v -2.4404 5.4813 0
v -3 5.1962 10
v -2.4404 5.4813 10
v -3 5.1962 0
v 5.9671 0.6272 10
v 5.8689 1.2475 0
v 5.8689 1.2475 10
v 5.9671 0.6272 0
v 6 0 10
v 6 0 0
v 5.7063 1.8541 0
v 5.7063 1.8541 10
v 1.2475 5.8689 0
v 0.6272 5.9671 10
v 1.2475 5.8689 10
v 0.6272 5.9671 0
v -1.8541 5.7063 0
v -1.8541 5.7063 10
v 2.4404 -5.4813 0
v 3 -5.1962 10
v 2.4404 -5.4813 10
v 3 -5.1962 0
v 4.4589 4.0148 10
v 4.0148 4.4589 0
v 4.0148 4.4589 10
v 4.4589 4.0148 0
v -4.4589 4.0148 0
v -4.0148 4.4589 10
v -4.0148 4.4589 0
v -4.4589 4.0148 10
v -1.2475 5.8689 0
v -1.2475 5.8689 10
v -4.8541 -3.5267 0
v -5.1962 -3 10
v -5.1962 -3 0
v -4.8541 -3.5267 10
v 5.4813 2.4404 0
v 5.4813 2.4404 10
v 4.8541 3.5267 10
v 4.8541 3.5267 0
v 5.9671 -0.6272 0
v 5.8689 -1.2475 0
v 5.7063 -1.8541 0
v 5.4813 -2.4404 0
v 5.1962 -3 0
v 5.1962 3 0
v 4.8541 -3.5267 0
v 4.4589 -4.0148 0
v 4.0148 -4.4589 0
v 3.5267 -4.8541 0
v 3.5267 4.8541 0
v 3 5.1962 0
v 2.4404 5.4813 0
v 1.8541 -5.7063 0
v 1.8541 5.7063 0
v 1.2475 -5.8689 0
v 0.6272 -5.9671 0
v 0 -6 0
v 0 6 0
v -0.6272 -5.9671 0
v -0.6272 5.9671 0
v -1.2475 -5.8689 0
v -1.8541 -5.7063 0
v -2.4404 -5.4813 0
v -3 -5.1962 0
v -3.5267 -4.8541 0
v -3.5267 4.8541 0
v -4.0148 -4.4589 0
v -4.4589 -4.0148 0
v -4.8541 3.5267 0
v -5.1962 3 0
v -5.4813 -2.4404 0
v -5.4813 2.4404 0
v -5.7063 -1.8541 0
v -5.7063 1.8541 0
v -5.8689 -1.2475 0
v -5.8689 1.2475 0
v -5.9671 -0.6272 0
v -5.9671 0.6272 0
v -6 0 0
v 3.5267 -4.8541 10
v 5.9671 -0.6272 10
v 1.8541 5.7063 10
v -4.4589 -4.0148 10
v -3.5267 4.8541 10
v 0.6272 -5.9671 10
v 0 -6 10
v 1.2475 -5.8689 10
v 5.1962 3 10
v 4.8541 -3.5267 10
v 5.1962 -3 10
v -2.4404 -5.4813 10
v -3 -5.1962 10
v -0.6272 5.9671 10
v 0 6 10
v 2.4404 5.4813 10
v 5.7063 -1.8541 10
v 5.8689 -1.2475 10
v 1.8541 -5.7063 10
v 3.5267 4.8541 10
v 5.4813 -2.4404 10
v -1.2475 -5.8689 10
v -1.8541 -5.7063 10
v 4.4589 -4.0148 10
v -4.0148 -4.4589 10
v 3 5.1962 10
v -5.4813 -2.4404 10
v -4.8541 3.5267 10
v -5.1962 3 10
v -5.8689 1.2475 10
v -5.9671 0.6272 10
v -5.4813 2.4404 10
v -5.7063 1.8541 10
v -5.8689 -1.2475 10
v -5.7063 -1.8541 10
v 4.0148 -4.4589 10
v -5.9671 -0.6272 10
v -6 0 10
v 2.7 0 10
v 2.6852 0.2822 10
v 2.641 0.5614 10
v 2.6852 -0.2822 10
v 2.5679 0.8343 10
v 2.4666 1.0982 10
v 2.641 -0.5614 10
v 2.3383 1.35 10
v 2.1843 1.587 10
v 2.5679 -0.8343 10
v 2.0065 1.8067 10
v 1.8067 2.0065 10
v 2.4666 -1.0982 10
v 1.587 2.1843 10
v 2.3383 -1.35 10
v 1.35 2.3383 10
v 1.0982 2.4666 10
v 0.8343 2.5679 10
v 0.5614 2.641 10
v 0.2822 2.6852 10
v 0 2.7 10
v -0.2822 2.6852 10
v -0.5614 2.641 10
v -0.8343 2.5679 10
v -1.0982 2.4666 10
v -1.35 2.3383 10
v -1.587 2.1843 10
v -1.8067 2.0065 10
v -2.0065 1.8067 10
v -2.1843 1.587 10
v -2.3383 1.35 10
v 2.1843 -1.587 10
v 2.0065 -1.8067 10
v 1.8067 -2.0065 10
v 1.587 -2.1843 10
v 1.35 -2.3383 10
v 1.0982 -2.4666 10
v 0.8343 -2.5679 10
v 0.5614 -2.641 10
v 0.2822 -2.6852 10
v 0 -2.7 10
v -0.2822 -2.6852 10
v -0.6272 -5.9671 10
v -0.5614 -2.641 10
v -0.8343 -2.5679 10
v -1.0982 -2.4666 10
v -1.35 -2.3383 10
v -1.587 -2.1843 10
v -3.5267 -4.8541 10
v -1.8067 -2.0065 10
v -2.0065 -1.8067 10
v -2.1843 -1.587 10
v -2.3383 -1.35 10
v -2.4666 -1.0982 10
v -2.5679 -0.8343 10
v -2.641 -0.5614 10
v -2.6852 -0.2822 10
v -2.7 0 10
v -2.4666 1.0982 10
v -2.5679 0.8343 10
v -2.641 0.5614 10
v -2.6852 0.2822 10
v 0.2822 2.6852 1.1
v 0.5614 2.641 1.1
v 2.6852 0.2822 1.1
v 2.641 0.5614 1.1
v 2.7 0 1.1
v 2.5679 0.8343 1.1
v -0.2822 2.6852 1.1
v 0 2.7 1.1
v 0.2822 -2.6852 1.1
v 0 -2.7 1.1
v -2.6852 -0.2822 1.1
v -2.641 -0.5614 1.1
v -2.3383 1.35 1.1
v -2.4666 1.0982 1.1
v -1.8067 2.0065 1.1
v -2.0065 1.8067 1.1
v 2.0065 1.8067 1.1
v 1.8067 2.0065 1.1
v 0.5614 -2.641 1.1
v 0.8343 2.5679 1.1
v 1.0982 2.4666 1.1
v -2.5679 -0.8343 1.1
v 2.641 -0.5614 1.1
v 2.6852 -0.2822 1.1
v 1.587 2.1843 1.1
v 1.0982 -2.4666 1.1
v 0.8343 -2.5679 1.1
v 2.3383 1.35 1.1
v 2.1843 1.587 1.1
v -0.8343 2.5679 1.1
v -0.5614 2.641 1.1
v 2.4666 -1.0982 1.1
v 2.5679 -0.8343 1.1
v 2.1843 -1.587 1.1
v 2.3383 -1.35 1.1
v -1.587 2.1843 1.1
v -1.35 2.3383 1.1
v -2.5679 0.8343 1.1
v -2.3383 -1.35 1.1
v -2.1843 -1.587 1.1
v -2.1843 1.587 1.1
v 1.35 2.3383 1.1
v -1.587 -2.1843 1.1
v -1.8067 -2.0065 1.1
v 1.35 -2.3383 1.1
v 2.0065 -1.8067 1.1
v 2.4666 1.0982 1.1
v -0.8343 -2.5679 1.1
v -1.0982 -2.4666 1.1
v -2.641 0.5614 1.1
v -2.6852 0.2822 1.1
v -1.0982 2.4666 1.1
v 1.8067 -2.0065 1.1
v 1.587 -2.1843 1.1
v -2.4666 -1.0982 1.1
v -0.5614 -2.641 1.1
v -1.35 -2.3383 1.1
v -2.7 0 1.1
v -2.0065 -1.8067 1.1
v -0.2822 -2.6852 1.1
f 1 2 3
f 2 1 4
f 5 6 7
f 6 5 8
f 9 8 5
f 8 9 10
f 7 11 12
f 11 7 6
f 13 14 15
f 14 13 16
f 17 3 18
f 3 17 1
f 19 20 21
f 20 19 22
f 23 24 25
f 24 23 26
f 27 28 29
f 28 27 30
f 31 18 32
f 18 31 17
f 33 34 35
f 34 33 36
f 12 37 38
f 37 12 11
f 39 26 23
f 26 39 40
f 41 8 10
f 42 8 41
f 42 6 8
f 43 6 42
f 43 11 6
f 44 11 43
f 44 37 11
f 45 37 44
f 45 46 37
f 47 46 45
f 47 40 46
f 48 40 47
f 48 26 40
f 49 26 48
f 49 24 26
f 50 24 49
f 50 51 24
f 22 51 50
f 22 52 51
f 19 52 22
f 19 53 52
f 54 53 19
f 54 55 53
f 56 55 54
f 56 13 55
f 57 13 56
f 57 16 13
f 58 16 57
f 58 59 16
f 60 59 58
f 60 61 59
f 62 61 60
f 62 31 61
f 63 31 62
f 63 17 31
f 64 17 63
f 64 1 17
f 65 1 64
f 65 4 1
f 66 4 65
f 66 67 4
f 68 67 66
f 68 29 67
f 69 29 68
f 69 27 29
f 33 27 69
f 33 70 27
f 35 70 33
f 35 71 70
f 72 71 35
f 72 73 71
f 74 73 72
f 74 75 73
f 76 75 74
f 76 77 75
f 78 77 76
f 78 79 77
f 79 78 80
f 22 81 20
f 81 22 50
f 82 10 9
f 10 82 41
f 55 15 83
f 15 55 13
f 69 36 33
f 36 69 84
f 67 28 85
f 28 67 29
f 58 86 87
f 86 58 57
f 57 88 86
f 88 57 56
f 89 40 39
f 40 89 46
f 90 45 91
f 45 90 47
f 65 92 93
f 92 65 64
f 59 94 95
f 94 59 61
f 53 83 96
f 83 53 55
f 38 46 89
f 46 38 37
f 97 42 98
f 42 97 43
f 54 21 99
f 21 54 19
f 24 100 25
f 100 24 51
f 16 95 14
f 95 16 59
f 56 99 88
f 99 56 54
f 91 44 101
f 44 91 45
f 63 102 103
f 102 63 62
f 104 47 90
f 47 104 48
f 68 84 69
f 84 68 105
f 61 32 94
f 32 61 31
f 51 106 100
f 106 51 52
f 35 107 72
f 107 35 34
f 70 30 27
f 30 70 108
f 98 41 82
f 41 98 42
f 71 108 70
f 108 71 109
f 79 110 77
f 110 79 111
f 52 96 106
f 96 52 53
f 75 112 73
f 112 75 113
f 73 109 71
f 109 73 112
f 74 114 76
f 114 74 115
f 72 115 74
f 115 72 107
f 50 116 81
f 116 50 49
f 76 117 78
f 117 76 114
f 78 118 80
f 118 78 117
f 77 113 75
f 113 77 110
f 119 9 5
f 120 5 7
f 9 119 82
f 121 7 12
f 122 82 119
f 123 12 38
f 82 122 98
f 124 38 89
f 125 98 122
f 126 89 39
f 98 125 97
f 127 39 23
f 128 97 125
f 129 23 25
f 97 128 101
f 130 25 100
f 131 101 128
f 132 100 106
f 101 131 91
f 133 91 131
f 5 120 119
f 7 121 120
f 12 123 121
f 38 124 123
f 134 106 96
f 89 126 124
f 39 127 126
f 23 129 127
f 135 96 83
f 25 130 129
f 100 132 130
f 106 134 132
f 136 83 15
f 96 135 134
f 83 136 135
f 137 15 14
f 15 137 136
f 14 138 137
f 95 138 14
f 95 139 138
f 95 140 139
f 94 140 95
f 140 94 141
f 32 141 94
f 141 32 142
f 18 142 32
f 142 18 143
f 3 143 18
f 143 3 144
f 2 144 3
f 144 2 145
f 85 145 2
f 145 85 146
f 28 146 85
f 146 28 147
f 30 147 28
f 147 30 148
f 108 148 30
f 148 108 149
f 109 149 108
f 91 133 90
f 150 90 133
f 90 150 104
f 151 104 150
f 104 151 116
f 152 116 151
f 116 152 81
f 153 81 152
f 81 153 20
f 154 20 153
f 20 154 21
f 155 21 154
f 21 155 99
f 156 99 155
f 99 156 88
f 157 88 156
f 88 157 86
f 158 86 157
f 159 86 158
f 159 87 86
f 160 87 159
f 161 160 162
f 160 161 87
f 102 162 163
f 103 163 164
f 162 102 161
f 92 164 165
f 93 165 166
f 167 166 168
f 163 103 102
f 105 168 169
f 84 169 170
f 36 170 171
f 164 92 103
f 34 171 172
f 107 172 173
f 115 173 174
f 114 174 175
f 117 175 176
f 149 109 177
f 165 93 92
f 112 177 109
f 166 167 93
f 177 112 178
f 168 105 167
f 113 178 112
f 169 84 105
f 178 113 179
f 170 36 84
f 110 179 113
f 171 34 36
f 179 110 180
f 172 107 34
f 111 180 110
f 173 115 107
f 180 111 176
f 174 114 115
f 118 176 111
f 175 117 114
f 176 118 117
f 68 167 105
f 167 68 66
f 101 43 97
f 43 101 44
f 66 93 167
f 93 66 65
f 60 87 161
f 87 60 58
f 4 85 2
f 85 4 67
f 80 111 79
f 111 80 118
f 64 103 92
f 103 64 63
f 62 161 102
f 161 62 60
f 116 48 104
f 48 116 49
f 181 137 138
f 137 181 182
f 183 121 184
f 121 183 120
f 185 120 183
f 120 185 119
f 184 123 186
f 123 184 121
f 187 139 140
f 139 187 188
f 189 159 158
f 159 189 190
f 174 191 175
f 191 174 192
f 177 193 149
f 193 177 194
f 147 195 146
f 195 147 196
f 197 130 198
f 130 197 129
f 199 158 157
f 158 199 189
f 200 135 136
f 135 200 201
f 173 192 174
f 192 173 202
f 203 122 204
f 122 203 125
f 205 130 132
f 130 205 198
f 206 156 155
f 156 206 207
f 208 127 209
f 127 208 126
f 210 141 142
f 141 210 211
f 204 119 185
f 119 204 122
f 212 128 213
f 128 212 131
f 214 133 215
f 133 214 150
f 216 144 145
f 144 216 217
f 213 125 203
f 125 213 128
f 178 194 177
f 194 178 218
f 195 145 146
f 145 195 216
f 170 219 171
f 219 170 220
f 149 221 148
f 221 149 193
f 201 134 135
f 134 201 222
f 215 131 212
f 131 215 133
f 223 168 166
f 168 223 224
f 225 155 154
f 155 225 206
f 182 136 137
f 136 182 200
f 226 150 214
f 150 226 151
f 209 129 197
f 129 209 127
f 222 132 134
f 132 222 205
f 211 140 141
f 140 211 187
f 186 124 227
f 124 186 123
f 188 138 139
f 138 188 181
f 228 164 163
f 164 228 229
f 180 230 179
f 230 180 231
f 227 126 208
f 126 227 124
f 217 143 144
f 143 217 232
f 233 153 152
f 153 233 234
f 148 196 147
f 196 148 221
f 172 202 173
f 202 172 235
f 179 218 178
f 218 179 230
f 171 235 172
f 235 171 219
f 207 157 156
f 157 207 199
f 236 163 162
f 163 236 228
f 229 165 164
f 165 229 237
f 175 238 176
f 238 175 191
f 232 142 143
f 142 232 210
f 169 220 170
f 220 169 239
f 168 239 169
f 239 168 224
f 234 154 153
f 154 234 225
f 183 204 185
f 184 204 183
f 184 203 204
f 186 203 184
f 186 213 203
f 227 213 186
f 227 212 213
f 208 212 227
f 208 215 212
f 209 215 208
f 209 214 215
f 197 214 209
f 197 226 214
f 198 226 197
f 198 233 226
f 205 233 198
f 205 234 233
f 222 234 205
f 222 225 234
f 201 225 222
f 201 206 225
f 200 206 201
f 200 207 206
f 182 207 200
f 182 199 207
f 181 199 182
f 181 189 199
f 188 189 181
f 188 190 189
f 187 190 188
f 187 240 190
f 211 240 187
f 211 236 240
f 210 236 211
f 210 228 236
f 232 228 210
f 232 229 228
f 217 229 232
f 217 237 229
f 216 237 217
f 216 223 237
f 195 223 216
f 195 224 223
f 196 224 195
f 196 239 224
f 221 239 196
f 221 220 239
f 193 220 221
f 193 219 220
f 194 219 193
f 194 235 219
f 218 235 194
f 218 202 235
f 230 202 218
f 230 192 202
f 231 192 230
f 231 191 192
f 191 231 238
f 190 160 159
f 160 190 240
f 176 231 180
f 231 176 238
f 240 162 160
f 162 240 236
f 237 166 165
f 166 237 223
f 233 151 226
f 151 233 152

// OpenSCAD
$fn=60;

difference() {
	cylinder(r=6, h=10);
	translate([0,0,1.1]) cylinder(r=5.4/2, h=9);
}
